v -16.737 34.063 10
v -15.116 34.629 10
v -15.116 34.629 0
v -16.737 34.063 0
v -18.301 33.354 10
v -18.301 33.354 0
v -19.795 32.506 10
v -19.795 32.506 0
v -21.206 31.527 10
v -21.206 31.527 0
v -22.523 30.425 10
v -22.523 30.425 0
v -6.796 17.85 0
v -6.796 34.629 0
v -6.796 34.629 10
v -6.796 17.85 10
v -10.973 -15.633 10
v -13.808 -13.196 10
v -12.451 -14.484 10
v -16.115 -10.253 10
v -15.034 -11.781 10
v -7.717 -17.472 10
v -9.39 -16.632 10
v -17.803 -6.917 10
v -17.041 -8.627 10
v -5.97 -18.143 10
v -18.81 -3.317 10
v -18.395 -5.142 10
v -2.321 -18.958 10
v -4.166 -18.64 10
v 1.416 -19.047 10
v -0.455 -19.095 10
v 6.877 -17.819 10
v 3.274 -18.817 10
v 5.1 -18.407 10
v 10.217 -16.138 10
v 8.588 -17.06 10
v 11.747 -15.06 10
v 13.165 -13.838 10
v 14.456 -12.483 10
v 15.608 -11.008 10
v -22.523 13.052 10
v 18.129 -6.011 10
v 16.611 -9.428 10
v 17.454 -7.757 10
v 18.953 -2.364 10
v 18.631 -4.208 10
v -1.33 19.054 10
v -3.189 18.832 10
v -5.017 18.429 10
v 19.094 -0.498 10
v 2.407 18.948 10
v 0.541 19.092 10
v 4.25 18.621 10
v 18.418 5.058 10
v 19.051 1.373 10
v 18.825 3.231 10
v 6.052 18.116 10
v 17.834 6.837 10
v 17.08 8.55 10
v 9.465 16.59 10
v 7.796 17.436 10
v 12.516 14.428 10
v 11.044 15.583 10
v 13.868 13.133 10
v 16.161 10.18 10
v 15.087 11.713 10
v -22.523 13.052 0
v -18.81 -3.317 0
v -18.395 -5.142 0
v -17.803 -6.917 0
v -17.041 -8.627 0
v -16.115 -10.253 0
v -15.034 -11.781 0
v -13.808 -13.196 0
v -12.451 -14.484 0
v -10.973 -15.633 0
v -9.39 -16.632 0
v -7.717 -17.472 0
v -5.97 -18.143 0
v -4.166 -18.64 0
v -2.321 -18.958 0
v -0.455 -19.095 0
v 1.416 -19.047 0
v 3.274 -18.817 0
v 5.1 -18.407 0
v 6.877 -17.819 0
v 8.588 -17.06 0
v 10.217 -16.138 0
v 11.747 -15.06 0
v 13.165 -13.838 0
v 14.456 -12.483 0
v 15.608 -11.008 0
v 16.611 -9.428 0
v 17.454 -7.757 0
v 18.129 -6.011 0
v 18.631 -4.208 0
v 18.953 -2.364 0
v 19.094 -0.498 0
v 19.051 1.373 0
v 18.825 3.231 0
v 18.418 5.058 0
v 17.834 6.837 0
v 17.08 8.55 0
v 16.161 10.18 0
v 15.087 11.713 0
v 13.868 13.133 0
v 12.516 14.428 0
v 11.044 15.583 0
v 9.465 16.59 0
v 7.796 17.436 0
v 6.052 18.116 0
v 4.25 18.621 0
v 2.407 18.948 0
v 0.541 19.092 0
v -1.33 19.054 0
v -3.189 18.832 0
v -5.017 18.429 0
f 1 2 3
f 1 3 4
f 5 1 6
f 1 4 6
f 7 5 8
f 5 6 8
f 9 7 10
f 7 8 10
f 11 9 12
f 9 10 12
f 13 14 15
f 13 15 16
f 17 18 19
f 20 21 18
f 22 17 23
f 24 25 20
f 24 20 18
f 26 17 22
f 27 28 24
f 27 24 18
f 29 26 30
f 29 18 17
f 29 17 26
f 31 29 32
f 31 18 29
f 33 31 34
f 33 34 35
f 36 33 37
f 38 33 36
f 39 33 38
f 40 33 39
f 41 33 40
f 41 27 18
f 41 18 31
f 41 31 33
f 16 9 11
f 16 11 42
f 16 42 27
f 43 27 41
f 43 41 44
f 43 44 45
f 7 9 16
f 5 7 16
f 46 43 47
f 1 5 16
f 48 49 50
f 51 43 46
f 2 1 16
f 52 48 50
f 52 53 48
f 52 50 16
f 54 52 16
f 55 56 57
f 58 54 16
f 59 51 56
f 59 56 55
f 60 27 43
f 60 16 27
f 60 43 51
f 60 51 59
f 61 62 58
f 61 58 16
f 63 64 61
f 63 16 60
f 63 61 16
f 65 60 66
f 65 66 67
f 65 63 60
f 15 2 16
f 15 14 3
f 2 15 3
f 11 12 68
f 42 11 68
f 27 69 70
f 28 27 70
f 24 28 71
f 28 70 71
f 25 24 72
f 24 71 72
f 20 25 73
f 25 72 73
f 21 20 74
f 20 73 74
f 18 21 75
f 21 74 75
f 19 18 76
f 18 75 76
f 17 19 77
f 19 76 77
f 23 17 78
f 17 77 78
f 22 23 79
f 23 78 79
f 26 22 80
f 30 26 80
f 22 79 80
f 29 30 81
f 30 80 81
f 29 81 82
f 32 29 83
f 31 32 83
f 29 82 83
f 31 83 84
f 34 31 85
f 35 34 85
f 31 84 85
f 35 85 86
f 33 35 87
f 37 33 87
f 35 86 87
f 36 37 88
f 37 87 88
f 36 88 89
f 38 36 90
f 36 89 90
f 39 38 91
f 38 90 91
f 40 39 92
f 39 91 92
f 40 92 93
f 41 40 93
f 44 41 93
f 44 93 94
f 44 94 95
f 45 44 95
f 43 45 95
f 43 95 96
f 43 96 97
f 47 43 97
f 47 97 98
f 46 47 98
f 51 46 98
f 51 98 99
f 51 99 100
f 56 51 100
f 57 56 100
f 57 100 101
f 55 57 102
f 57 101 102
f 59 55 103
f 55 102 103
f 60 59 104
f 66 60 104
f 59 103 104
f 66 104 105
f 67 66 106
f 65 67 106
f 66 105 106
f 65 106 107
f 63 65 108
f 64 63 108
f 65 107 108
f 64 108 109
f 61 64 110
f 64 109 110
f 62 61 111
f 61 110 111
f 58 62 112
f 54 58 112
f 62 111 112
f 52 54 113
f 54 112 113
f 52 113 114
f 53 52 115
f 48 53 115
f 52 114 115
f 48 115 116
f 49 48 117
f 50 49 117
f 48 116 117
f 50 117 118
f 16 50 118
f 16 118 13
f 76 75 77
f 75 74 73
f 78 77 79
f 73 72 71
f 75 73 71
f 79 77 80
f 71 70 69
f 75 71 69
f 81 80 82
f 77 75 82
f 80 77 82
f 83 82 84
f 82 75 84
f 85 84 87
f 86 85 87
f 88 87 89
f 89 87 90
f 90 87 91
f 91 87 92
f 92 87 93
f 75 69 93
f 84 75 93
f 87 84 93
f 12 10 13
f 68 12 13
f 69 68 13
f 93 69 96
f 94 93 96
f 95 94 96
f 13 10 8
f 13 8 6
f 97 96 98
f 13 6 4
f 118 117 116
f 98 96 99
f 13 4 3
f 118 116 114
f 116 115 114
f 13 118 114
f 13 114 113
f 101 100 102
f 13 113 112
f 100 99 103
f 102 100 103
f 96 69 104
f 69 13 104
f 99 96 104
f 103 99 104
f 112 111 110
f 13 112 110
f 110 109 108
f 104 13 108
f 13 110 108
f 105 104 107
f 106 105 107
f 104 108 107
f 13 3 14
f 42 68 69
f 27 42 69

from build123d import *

# Parameters (mm, degrees)
PAD_DEPTH = 10


with BuildPart() as part:
    # Sketch002 → Pad (new body)
    with BuildSketch(Plane.XY):
        with BuildLine():
            ThreePointArc((-18.809847, -3.316572), (16.610979, -9.427904), (-6.796374, 17.849911))
            Line((-6.796374, 34.628607), (-6.796374, 17.849911))
            Line((-6.796374, 34.628607), (-15.115935, 34.628607))
            ThreePointArc((-15.115935, 34.628607), (-19.057395, 32.946654), (-22.522612, 30.425474))
            Line((-22.522612, 30.425474), (-22.522612, 13.051797))
            Line((-22.522612, 13.051797), (-18.809847, -3.316572))
        make_face()
    extrude(amount=PAD_DEPTH)


solid = part.part
